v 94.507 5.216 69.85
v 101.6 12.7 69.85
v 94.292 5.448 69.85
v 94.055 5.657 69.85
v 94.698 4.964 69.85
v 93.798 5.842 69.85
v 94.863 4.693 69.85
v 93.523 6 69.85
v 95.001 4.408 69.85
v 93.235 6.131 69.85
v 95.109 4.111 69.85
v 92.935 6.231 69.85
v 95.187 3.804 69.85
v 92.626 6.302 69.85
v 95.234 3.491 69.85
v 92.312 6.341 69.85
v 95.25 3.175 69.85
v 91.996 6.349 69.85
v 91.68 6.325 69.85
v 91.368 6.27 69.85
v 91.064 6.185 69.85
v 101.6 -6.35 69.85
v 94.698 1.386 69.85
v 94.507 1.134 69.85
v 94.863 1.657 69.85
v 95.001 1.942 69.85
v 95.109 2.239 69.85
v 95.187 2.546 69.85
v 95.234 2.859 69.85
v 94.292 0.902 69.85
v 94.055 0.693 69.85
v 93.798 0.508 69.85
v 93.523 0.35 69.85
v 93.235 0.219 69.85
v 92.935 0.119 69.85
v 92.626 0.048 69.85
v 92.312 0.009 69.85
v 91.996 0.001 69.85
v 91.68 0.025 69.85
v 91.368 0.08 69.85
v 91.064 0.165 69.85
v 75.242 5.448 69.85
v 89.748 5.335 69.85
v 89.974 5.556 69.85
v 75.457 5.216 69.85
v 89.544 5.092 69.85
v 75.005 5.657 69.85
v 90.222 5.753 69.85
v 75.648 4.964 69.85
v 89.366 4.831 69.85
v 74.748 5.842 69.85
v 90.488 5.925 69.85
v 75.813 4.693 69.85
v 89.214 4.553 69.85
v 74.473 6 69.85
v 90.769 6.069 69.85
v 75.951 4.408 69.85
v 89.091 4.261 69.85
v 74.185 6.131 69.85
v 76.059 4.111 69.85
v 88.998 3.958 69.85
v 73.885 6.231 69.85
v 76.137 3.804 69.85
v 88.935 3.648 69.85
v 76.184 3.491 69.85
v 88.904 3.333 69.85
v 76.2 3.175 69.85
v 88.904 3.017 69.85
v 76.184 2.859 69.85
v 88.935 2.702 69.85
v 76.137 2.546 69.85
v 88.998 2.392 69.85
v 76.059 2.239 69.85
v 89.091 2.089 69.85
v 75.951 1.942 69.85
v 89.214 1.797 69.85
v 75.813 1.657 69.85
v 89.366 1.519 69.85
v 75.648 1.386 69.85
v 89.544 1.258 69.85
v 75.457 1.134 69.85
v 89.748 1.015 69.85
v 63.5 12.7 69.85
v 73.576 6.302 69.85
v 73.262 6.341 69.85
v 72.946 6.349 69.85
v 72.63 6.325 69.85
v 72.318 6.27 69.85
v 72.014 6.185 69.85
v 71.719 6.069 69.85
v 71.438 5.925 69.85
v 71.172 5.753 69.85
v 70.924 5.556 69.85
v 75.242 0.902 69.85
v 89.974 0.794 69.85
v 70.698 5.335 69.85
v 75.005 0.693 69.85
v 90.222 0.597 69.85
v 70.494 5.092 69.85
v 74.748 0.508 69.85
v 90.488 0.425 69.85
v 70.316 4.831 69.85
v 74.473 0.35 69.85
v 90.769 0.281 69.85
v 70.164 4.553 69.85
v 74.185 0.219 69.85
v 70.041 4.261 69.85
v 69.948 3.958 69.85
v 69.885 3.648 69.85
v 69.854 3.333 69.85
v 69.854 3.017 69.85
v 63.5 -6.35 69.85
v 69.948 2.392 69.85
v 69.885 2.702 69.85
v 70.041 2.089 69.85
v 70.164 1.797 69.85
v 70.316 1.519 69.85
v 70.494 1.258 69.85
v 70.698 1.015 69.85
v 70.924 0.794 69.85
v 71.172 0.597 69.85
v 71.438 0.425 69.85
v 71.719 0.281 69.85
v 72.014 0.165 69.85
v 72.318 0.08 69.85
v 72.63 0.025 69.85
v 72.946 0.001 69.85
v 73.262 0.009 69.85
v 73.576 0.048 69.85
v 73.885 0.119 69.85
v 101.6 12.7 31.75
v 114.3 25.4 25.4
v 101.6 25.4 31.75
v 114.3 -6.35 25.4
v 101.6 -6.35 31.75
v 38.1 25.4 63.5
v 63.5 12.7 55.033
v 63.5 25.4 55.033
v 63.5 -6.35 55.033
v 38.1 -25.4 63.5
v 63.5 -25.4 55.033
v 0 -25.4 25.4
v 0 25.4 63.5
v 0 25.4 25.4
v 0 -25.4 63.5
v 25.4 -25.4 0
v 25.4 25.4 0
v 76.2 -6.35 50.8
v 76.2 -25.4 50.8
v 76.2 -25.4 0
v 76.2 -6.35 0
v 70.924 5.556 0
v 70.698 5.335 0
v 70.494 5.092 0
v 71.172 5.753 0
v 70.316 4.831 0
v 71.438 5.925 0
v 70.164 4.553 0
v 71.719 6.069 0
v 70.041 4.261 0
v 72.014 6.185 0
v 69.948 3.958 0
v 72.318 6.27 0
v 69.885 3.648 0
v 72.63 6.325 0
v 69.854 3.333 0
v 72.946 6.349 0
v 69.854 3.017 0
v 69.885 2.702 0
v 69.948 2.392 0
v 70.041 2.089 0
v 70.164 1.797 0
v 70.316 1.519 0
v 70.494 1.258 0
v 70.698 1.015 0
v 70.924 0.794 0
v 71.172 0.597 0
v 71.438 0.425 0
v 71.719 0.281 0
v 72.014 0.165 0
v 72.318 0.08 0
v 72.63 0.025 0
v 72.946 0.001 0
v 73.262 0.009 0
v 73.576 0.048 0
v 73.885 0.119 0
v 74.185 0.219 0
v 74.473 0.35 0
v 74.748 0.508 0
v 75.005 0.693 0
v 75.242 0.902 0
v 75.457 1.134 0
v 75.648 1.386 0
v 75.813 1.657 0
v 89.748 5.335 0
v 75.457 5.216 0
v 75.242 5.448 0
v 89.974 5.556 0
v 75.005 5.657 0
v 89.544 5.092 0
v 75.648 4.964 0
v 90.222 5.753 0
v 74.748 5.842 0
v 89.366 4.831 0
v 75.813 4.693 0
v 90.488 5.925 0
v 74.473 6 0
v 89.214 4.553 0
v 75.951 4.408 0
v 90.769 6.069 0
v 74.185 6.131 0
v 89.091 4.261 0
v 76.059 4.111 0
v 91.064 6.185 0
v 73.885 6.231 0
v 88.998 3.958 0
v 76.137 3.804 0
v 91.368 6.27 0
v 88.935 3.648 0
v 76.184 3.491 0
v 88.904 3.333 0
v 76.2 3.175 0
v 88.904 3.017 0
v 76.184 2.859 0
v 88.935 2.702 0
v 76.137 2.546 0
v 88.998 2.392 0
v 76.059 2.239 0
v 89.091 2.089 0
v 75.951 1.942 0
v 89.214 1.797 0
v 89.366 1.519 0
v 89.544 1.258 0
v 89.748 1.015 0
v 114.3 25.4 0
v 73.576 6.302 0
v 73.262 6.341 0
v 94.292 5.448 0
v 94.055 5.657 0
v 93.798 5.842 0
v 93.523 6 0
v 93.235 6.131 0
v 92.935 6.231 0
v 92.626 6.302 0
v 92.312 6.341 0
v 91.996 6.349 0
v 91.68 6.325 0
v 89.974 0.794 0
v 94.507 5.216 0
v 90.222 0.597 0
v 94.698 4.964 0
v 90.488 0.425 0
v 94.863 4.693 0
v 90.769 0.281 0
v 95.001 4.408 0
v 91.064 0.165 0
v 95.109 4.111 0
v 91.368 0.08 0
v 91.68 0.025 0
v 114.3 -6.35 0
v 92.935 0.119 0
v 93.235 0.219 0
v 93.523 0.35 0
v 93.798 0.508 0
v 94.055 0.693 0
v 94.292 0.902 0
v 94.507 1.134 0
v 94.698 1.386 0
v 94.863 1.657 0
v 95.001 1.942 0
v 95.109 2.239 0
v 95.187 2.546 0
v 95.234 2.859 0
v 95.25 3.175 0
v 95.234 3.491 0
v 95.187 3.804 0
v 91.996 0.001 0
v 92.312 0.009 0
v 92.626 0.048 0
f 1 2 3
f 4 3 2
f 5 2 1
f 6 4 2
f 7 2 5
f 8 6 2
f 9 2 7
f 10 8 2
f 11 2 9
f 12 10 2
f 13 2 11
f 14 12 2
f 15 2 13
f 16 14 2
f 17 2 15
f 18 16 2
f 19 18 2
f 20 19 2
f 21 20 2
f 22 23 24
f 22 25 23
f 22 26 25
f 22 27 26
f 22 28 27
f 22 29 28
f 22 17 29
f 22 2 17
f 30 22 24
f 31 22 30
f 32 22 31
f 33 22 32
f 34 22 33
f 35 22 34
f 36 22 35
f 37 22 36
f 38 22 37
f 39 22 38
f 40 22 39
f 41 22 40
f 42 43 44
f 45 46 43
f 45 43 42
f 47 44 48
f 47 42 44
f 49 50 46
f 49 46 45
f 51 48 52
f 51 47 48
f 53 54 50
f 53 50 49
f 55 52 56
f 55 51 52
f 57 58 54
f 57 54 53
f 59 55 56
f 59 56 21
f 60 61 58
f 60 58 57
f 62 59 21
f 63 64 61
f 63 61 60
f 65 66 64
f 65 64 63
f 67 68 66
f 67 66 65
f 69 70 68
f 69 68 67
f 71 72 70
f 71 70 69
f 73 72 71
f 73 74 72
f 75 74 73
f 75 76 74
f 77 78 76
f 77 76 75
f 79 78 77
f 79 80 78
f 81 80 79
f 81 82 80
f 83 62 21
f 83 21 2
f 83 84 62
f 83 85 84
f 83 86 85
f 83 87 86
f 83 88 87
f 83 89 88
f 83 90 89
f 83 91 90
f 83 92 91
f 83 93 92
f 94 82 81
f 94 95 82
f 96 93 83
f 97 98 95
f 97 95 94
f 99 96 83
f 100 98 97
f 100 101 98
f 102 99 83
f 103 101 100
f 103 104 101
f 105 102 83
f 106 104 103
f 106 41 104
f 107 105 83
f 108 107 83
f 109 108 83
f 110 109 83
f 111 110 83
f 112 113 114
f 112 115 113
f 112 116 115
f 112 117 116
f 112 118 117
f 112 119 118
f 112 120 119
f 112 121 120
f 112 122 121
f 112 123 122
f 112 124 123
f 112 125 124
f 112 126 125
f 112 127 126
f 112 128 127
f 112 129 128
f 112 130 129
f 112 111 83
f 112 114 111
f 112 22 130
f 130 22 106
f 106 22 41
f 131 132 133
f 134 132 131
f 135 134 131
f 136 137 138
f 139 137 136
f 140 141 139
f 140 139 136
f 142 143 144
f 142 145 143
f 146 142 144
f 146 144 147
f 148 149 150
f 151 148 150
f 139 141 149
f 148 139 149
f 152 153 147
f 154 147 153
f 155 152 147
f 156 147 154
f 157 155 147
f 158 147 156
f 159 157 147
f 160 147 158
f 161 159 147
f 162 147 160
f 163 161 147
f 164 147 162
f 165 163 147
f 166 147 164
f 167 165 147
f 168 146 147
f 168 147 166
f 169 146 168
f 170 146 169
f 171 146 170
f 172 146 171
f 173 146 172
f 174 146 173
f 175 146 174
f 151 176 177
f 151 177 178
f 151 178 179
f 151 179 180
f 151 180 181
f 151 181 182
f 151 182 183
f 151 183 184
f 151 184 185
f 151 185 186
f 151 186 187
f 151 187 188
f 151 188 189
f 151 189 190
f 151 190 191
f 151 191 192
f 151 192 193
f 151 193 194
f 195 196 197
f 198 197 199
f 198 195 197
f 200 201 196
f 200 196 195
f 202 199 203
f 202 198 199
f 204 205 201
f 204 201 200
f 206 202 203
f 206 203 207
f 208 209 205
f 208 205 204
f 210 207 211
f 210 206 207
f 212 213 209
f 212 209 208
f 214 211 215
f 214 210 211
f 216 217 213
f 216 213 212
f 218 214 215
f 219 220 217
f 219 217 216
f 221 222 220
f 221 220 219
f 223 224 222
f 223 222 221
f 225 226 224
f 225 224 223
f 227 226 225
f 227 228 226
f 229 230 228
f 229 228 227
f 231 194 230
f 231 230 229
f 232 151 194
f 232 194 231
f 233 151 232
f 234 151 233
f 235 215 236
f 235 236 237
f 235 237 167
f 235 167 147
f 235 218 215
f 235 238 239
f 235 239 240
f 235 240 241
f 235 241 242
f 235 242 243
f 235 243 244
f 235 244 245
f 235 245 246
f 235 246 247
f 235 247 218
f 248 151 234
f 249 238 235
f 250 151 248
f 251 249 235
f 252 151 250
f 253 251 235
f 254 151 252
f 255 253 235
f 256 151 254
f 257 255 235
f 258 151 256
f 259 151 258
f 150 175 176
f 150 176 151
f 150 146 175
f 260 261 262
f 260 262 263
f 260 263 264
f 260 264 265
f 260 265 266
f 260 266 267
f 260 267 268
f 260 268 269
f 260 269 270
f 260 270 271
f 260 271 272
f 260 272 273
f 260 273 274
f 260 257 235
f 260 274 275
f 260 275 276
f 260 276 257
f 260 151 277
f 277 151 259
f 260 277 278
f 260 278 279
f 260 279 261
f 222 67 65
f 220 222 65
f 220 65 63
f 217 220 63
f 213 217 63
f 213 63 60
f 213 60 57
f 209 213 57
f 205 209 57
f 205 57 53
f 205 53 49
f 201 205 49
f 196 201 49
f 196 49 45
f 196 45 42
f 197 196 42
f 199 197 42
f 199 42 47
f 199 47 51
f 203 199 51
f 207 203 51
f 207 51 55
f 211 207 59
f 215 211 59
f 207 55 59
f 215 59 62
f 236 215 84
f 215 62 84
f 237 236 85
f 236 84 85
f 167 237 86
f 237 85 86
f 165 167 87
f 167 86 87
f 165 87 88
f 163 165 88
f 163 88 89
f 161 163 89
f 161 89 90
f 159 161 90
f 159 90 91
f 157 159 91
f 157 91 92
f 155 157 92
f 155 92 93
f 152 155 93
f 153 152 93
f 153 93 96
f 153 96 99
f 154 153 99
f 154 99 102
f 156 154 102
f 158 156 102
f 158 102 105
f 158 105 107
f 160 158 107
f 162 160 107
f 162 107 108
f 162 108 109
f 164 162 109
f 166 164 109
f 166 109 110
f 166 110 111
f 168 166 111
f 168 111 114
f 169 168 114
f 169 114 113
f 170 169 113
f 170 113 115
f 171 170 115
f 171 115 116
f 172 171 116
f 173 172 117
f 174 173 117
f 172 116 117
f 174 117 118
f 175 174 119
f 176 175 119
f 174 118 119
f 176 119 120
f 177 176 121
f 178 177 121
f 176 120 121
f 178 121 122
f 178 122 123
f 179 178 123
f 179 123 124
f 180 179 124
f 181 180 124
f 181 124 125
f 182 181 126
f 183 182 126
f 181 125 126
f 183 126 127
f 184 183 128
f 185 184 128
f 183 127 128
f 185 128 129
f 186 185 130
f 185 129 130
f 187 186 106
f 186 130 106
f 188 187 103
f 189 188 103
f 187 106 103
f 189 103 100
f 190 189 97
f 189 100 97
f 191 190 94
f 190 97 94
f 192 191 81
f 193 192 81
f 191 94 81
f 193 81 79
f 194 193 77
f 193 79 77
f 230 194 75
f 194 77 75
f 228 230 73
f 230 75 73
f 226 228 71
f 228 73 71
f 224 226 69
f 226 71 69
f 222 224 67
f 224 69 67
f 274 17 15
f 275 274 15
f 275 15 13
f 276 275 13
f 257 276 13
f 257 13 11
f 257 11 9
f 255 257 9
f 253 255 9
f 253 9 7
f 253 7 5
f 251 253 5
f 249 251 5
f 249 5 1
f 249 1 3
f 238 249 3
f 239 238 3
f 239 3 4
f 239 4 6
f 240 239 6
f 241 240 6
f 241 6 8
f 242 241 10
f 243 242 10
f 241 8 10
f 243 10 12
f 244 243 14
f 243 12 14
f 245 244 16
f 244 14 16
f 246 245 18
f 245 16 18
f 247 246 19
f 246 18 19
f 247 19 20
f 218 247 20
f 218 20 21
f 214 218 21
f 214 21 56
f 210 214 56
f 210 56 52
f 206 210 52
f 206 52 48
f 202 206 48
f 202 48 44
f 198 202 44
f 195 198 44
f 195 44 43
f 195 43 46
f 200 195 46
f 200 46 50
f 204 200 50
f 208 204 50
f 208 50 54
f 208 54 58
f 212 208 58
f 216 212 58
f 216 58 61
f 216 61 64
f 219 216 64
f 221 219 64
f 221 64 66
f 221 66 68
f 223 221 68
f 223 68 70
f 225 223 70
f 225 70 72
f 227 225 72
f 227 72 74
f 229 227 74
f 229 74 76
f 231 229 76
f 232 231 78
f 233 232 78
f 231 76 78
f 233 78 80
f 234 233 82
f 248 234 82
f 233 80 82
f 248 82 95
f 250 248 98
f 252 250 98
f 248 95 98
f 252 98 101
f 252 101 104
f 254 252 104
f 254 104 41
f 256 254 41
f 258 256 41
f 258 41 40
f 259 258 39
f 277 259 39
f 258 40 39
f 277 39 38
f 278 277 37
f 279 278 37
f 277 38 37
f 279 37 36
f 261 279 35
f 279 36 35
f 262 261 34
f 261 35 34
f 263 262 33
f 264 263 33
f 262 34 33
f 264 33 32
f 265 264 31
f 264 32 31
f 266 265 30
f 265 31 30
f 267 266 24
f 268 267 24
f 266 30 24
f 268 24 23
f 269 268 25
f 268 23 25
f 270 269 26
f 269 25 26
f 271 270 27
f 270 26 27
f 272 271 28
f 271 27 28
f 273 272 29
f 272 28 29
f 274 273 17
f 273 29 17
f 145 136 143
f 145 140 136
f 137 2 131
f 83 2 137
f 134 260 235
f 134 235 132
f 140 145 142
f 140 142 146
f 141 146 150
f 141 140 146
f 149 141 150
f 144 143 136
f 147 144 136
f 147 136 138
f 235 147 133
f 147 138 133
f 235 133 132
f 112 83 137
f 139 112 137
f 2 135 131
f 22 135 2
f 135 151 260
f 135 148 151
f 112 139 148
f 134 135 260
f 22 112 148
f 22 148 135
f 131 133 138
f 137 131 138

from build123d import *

# Parameters (mm, degrees)
F1_DEPTH = 25.4
F3_DEPTH = 19.05
F5_DEPTH = 12.7
F6_R     = 3.175
F7_DEPTH = 69.851


with BuildPart() as f1:
    # F0 (on Front) → F1 (new body, symmetric)
    with BuildSketch(Plane.XZ):
        Polygon((0, 63.5), (0, 25.4), (25.4, 0), (76.2, 0), (76.2, 50.8), (63.5, 55.033333), (38.1, 63.5), align=None)
        Polygon((76.2, 50.8), (76.2, 0), (114.3, 0), (114.3, 25.4), (101.6, 31.75), (101.6, 69.85), (76.2, 69.85), align=None)
        Polygon((63.5, 55.033333), (76.2, 50.8), (76.2, 69.85), (63.5, 69.85), align=None)
    extrude(amount=F1_DEPTH, both=True)

    # F2 (on face) → F3 (cut)
    with BuildSketch(Plane.XZ.offset(25.4)):
        Polygon((76.2, 0), (114.3, 0), (114.3, 25.4), (101.6, 31.75), (101.6, 69.85), (63.5, 69.85), (63.5, 55.033333), (76.2, 50.8), align=None)
    extrude(amount=-F3_DEPTH, mode=Mode.SUBTRACT)

    # F4 (on face) → F5 (cut)
    with BuildSketch(Plane(origin=(0, 25.4, 0), x_dir=(-1, 0, 0), z_dir=(0, 1, 0))):
        Polygon((-101.6, 69.85), (-101.6, 31.75), (-63.5, 55.033333), (-63.5, 69.85), align=None)
    extrude(amount=-F5_DEPTH, mode=Mode.SUBTRACT)

    # F6 (on face) → F7 (cut, through all)
    with BuildSketch(Plane.XY.offset(69.85)):
        with Locations((73.025, 3.175)):
            Circle(F6_R)
        with Locations((92.075, 3.175)):
            Circle(F6_R)
    extrude(amount=-F7_DEPTH, mode=Mode.SUBTRACT)


solid = f1.part
